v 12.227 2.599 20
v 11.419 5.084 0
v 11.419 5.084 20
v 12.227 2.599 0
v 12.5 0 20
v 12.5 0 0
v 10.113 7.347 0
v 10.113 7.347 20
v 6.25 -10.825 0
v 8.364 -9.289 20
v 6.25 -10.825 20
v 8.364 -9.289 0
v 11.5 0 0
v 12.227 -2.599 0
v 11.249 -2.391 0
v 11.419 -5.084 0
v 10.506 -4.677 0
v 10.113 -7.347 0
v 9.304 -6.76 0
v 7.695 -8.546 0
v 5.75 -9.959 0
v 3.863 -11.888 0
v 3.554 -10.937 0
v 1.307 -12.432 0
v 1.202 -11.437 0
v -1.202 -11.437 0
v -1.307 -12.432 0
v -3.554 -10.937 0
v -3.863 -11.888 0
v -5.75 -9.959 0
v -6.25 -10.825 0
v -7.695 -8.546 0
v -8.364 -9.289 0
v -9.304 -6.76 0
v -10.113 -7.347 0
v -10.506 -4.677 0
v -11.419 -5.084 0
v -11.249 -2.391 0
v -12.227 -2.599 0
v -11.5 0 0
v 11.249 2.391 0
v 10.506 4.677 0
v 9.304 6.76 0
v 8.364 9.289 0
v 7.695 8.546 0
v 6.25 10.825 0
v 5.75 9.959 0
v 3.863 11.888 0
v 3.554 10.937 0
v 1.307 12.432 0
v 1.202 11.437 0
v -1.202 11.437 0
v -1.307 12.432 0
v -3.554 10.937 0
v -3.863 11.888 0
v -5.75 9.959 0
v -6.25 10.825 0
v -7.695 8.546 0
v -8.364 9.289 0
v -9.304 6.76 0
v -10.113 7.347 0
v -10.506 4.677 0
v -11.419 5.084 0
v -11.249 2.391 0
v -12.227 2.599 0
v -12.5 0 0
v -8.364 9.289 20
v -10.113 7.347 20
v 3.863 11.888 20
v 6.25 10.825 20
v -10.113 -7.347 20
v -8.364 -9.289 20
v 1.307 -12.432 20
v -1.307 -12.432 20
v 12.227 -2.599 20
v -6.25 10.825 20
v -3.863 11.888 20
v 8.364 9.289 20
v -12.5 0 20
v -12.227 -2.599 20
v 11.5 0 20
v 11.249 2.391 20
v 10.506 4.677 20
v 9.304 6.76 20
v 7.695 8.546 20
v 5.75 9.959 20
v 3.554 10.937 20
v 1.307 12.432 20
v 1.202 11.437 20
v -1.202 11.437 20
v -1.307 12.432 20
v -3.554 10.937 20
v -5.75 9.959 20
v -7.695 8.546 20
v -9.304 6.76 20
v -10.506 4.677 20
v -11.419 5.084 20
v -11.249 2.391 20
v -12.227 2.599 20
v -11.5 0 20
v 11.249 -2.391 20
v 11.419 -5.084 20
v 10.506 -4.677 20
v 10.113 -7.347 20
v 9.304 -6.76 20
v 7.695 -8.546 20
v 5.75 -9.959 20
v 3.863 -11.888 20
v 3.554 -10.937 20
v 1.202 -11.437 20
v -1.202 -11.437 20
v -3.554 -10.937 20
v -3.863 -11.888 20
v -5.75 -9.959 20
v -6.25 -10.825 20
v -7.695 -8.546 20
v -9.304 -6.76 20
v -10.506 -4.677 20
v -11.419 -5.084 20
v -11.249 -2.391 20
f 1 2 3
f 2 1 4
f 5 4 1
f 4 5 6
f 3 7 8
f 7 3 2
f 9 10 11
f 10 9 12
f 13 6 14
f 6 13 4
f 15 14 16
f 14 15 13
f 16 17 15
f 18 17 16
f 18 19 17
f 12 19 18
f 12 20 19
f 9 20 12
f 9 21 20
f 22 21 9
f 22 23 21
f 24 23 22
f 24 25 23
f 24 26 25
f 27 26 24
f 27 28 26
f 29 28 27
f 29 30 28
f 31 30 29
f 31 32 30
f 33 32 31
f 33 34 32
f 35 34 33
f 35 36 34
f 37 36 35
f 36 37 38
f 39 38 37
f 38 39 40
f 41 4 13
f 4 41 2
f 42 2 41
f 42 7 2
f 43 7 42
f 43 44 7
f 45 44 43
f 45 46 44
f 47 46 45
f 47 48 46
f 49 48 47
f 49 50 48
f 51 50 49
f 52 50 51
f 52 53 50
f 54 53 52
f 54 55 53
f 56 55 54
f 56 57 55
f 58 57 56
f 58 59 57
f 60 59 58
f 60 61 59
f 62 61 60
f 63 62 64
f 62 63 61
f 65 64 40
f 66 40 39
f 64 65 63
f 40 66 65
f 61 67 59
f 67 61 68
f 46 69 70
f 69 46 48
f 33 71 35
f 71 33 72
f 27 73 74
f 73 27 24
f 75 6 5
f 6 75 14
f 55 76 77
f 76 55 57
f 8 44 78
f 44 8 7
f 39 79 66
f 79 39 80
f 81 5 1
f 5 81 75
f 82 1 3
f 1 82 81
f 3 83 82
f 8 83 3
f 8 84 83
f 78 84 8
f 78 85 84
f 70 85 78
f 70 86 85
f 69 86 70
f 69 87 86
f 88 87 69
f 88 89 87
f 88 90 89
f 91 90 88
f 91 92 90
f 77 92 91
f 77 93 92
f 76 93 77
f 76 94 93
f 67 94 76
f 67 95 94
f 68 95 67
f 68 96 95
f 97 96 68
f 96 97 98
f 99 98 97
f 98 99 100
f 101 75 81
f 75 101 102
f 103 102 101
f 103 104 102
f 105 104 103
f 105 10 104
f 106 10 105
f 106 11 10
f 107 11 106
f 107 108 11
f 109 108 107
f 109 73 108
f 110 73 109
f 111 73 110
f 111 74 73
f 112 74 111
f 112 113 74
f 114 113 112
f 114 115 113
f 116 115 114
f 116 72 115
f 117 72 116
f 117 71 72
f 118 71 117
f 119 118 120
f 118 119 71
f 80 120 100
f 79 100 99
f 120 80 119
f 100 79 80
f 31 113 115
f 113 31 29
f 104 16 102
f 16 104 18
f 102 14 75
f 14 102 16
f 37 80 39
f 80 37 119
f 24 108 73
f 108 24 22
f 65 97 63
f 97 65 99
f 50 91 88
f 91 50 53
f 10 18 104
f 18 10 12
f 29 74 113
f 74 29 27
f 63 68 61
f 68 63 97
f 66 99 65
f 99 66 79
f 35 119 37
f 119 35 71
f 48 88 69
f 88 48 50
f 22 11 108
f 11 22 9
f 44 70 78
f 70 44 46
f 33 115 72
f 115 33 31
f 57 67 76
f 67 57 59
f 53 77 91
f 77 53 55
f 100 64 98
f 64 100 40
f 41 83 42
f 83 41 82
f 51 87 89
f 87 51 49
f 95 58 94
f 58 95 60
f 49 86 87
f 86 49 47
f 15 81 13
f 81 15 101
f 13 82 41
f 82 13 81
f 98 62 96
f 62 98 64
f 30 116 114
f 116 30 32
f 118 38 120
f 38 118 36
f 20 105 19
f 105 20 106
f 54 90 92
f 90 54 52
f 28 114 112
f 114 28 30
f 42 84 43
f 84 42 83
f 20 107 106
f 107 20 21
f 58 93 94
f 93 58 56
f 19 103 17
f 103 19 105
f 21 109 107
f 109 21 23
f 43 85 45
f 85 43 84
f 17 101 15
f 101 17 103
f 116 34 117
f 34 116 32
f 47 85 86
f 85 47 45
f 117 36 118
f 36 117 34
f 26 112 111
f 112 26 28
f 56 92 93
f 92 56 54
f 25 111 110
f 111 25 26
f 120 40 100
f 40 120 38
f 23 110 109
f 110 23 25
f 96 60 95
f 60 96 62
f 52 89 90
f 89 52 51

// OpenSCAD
dia = 25; // mm
th  = 1;  // mm
h   = 20;
tol = 0.1; // mm

difference() {
	cylinder(r=dia/2,h=h);
	translate([0,0,-1*tol])
		cylinder(r=dia/2 - th,h=h+2*tol);
}
